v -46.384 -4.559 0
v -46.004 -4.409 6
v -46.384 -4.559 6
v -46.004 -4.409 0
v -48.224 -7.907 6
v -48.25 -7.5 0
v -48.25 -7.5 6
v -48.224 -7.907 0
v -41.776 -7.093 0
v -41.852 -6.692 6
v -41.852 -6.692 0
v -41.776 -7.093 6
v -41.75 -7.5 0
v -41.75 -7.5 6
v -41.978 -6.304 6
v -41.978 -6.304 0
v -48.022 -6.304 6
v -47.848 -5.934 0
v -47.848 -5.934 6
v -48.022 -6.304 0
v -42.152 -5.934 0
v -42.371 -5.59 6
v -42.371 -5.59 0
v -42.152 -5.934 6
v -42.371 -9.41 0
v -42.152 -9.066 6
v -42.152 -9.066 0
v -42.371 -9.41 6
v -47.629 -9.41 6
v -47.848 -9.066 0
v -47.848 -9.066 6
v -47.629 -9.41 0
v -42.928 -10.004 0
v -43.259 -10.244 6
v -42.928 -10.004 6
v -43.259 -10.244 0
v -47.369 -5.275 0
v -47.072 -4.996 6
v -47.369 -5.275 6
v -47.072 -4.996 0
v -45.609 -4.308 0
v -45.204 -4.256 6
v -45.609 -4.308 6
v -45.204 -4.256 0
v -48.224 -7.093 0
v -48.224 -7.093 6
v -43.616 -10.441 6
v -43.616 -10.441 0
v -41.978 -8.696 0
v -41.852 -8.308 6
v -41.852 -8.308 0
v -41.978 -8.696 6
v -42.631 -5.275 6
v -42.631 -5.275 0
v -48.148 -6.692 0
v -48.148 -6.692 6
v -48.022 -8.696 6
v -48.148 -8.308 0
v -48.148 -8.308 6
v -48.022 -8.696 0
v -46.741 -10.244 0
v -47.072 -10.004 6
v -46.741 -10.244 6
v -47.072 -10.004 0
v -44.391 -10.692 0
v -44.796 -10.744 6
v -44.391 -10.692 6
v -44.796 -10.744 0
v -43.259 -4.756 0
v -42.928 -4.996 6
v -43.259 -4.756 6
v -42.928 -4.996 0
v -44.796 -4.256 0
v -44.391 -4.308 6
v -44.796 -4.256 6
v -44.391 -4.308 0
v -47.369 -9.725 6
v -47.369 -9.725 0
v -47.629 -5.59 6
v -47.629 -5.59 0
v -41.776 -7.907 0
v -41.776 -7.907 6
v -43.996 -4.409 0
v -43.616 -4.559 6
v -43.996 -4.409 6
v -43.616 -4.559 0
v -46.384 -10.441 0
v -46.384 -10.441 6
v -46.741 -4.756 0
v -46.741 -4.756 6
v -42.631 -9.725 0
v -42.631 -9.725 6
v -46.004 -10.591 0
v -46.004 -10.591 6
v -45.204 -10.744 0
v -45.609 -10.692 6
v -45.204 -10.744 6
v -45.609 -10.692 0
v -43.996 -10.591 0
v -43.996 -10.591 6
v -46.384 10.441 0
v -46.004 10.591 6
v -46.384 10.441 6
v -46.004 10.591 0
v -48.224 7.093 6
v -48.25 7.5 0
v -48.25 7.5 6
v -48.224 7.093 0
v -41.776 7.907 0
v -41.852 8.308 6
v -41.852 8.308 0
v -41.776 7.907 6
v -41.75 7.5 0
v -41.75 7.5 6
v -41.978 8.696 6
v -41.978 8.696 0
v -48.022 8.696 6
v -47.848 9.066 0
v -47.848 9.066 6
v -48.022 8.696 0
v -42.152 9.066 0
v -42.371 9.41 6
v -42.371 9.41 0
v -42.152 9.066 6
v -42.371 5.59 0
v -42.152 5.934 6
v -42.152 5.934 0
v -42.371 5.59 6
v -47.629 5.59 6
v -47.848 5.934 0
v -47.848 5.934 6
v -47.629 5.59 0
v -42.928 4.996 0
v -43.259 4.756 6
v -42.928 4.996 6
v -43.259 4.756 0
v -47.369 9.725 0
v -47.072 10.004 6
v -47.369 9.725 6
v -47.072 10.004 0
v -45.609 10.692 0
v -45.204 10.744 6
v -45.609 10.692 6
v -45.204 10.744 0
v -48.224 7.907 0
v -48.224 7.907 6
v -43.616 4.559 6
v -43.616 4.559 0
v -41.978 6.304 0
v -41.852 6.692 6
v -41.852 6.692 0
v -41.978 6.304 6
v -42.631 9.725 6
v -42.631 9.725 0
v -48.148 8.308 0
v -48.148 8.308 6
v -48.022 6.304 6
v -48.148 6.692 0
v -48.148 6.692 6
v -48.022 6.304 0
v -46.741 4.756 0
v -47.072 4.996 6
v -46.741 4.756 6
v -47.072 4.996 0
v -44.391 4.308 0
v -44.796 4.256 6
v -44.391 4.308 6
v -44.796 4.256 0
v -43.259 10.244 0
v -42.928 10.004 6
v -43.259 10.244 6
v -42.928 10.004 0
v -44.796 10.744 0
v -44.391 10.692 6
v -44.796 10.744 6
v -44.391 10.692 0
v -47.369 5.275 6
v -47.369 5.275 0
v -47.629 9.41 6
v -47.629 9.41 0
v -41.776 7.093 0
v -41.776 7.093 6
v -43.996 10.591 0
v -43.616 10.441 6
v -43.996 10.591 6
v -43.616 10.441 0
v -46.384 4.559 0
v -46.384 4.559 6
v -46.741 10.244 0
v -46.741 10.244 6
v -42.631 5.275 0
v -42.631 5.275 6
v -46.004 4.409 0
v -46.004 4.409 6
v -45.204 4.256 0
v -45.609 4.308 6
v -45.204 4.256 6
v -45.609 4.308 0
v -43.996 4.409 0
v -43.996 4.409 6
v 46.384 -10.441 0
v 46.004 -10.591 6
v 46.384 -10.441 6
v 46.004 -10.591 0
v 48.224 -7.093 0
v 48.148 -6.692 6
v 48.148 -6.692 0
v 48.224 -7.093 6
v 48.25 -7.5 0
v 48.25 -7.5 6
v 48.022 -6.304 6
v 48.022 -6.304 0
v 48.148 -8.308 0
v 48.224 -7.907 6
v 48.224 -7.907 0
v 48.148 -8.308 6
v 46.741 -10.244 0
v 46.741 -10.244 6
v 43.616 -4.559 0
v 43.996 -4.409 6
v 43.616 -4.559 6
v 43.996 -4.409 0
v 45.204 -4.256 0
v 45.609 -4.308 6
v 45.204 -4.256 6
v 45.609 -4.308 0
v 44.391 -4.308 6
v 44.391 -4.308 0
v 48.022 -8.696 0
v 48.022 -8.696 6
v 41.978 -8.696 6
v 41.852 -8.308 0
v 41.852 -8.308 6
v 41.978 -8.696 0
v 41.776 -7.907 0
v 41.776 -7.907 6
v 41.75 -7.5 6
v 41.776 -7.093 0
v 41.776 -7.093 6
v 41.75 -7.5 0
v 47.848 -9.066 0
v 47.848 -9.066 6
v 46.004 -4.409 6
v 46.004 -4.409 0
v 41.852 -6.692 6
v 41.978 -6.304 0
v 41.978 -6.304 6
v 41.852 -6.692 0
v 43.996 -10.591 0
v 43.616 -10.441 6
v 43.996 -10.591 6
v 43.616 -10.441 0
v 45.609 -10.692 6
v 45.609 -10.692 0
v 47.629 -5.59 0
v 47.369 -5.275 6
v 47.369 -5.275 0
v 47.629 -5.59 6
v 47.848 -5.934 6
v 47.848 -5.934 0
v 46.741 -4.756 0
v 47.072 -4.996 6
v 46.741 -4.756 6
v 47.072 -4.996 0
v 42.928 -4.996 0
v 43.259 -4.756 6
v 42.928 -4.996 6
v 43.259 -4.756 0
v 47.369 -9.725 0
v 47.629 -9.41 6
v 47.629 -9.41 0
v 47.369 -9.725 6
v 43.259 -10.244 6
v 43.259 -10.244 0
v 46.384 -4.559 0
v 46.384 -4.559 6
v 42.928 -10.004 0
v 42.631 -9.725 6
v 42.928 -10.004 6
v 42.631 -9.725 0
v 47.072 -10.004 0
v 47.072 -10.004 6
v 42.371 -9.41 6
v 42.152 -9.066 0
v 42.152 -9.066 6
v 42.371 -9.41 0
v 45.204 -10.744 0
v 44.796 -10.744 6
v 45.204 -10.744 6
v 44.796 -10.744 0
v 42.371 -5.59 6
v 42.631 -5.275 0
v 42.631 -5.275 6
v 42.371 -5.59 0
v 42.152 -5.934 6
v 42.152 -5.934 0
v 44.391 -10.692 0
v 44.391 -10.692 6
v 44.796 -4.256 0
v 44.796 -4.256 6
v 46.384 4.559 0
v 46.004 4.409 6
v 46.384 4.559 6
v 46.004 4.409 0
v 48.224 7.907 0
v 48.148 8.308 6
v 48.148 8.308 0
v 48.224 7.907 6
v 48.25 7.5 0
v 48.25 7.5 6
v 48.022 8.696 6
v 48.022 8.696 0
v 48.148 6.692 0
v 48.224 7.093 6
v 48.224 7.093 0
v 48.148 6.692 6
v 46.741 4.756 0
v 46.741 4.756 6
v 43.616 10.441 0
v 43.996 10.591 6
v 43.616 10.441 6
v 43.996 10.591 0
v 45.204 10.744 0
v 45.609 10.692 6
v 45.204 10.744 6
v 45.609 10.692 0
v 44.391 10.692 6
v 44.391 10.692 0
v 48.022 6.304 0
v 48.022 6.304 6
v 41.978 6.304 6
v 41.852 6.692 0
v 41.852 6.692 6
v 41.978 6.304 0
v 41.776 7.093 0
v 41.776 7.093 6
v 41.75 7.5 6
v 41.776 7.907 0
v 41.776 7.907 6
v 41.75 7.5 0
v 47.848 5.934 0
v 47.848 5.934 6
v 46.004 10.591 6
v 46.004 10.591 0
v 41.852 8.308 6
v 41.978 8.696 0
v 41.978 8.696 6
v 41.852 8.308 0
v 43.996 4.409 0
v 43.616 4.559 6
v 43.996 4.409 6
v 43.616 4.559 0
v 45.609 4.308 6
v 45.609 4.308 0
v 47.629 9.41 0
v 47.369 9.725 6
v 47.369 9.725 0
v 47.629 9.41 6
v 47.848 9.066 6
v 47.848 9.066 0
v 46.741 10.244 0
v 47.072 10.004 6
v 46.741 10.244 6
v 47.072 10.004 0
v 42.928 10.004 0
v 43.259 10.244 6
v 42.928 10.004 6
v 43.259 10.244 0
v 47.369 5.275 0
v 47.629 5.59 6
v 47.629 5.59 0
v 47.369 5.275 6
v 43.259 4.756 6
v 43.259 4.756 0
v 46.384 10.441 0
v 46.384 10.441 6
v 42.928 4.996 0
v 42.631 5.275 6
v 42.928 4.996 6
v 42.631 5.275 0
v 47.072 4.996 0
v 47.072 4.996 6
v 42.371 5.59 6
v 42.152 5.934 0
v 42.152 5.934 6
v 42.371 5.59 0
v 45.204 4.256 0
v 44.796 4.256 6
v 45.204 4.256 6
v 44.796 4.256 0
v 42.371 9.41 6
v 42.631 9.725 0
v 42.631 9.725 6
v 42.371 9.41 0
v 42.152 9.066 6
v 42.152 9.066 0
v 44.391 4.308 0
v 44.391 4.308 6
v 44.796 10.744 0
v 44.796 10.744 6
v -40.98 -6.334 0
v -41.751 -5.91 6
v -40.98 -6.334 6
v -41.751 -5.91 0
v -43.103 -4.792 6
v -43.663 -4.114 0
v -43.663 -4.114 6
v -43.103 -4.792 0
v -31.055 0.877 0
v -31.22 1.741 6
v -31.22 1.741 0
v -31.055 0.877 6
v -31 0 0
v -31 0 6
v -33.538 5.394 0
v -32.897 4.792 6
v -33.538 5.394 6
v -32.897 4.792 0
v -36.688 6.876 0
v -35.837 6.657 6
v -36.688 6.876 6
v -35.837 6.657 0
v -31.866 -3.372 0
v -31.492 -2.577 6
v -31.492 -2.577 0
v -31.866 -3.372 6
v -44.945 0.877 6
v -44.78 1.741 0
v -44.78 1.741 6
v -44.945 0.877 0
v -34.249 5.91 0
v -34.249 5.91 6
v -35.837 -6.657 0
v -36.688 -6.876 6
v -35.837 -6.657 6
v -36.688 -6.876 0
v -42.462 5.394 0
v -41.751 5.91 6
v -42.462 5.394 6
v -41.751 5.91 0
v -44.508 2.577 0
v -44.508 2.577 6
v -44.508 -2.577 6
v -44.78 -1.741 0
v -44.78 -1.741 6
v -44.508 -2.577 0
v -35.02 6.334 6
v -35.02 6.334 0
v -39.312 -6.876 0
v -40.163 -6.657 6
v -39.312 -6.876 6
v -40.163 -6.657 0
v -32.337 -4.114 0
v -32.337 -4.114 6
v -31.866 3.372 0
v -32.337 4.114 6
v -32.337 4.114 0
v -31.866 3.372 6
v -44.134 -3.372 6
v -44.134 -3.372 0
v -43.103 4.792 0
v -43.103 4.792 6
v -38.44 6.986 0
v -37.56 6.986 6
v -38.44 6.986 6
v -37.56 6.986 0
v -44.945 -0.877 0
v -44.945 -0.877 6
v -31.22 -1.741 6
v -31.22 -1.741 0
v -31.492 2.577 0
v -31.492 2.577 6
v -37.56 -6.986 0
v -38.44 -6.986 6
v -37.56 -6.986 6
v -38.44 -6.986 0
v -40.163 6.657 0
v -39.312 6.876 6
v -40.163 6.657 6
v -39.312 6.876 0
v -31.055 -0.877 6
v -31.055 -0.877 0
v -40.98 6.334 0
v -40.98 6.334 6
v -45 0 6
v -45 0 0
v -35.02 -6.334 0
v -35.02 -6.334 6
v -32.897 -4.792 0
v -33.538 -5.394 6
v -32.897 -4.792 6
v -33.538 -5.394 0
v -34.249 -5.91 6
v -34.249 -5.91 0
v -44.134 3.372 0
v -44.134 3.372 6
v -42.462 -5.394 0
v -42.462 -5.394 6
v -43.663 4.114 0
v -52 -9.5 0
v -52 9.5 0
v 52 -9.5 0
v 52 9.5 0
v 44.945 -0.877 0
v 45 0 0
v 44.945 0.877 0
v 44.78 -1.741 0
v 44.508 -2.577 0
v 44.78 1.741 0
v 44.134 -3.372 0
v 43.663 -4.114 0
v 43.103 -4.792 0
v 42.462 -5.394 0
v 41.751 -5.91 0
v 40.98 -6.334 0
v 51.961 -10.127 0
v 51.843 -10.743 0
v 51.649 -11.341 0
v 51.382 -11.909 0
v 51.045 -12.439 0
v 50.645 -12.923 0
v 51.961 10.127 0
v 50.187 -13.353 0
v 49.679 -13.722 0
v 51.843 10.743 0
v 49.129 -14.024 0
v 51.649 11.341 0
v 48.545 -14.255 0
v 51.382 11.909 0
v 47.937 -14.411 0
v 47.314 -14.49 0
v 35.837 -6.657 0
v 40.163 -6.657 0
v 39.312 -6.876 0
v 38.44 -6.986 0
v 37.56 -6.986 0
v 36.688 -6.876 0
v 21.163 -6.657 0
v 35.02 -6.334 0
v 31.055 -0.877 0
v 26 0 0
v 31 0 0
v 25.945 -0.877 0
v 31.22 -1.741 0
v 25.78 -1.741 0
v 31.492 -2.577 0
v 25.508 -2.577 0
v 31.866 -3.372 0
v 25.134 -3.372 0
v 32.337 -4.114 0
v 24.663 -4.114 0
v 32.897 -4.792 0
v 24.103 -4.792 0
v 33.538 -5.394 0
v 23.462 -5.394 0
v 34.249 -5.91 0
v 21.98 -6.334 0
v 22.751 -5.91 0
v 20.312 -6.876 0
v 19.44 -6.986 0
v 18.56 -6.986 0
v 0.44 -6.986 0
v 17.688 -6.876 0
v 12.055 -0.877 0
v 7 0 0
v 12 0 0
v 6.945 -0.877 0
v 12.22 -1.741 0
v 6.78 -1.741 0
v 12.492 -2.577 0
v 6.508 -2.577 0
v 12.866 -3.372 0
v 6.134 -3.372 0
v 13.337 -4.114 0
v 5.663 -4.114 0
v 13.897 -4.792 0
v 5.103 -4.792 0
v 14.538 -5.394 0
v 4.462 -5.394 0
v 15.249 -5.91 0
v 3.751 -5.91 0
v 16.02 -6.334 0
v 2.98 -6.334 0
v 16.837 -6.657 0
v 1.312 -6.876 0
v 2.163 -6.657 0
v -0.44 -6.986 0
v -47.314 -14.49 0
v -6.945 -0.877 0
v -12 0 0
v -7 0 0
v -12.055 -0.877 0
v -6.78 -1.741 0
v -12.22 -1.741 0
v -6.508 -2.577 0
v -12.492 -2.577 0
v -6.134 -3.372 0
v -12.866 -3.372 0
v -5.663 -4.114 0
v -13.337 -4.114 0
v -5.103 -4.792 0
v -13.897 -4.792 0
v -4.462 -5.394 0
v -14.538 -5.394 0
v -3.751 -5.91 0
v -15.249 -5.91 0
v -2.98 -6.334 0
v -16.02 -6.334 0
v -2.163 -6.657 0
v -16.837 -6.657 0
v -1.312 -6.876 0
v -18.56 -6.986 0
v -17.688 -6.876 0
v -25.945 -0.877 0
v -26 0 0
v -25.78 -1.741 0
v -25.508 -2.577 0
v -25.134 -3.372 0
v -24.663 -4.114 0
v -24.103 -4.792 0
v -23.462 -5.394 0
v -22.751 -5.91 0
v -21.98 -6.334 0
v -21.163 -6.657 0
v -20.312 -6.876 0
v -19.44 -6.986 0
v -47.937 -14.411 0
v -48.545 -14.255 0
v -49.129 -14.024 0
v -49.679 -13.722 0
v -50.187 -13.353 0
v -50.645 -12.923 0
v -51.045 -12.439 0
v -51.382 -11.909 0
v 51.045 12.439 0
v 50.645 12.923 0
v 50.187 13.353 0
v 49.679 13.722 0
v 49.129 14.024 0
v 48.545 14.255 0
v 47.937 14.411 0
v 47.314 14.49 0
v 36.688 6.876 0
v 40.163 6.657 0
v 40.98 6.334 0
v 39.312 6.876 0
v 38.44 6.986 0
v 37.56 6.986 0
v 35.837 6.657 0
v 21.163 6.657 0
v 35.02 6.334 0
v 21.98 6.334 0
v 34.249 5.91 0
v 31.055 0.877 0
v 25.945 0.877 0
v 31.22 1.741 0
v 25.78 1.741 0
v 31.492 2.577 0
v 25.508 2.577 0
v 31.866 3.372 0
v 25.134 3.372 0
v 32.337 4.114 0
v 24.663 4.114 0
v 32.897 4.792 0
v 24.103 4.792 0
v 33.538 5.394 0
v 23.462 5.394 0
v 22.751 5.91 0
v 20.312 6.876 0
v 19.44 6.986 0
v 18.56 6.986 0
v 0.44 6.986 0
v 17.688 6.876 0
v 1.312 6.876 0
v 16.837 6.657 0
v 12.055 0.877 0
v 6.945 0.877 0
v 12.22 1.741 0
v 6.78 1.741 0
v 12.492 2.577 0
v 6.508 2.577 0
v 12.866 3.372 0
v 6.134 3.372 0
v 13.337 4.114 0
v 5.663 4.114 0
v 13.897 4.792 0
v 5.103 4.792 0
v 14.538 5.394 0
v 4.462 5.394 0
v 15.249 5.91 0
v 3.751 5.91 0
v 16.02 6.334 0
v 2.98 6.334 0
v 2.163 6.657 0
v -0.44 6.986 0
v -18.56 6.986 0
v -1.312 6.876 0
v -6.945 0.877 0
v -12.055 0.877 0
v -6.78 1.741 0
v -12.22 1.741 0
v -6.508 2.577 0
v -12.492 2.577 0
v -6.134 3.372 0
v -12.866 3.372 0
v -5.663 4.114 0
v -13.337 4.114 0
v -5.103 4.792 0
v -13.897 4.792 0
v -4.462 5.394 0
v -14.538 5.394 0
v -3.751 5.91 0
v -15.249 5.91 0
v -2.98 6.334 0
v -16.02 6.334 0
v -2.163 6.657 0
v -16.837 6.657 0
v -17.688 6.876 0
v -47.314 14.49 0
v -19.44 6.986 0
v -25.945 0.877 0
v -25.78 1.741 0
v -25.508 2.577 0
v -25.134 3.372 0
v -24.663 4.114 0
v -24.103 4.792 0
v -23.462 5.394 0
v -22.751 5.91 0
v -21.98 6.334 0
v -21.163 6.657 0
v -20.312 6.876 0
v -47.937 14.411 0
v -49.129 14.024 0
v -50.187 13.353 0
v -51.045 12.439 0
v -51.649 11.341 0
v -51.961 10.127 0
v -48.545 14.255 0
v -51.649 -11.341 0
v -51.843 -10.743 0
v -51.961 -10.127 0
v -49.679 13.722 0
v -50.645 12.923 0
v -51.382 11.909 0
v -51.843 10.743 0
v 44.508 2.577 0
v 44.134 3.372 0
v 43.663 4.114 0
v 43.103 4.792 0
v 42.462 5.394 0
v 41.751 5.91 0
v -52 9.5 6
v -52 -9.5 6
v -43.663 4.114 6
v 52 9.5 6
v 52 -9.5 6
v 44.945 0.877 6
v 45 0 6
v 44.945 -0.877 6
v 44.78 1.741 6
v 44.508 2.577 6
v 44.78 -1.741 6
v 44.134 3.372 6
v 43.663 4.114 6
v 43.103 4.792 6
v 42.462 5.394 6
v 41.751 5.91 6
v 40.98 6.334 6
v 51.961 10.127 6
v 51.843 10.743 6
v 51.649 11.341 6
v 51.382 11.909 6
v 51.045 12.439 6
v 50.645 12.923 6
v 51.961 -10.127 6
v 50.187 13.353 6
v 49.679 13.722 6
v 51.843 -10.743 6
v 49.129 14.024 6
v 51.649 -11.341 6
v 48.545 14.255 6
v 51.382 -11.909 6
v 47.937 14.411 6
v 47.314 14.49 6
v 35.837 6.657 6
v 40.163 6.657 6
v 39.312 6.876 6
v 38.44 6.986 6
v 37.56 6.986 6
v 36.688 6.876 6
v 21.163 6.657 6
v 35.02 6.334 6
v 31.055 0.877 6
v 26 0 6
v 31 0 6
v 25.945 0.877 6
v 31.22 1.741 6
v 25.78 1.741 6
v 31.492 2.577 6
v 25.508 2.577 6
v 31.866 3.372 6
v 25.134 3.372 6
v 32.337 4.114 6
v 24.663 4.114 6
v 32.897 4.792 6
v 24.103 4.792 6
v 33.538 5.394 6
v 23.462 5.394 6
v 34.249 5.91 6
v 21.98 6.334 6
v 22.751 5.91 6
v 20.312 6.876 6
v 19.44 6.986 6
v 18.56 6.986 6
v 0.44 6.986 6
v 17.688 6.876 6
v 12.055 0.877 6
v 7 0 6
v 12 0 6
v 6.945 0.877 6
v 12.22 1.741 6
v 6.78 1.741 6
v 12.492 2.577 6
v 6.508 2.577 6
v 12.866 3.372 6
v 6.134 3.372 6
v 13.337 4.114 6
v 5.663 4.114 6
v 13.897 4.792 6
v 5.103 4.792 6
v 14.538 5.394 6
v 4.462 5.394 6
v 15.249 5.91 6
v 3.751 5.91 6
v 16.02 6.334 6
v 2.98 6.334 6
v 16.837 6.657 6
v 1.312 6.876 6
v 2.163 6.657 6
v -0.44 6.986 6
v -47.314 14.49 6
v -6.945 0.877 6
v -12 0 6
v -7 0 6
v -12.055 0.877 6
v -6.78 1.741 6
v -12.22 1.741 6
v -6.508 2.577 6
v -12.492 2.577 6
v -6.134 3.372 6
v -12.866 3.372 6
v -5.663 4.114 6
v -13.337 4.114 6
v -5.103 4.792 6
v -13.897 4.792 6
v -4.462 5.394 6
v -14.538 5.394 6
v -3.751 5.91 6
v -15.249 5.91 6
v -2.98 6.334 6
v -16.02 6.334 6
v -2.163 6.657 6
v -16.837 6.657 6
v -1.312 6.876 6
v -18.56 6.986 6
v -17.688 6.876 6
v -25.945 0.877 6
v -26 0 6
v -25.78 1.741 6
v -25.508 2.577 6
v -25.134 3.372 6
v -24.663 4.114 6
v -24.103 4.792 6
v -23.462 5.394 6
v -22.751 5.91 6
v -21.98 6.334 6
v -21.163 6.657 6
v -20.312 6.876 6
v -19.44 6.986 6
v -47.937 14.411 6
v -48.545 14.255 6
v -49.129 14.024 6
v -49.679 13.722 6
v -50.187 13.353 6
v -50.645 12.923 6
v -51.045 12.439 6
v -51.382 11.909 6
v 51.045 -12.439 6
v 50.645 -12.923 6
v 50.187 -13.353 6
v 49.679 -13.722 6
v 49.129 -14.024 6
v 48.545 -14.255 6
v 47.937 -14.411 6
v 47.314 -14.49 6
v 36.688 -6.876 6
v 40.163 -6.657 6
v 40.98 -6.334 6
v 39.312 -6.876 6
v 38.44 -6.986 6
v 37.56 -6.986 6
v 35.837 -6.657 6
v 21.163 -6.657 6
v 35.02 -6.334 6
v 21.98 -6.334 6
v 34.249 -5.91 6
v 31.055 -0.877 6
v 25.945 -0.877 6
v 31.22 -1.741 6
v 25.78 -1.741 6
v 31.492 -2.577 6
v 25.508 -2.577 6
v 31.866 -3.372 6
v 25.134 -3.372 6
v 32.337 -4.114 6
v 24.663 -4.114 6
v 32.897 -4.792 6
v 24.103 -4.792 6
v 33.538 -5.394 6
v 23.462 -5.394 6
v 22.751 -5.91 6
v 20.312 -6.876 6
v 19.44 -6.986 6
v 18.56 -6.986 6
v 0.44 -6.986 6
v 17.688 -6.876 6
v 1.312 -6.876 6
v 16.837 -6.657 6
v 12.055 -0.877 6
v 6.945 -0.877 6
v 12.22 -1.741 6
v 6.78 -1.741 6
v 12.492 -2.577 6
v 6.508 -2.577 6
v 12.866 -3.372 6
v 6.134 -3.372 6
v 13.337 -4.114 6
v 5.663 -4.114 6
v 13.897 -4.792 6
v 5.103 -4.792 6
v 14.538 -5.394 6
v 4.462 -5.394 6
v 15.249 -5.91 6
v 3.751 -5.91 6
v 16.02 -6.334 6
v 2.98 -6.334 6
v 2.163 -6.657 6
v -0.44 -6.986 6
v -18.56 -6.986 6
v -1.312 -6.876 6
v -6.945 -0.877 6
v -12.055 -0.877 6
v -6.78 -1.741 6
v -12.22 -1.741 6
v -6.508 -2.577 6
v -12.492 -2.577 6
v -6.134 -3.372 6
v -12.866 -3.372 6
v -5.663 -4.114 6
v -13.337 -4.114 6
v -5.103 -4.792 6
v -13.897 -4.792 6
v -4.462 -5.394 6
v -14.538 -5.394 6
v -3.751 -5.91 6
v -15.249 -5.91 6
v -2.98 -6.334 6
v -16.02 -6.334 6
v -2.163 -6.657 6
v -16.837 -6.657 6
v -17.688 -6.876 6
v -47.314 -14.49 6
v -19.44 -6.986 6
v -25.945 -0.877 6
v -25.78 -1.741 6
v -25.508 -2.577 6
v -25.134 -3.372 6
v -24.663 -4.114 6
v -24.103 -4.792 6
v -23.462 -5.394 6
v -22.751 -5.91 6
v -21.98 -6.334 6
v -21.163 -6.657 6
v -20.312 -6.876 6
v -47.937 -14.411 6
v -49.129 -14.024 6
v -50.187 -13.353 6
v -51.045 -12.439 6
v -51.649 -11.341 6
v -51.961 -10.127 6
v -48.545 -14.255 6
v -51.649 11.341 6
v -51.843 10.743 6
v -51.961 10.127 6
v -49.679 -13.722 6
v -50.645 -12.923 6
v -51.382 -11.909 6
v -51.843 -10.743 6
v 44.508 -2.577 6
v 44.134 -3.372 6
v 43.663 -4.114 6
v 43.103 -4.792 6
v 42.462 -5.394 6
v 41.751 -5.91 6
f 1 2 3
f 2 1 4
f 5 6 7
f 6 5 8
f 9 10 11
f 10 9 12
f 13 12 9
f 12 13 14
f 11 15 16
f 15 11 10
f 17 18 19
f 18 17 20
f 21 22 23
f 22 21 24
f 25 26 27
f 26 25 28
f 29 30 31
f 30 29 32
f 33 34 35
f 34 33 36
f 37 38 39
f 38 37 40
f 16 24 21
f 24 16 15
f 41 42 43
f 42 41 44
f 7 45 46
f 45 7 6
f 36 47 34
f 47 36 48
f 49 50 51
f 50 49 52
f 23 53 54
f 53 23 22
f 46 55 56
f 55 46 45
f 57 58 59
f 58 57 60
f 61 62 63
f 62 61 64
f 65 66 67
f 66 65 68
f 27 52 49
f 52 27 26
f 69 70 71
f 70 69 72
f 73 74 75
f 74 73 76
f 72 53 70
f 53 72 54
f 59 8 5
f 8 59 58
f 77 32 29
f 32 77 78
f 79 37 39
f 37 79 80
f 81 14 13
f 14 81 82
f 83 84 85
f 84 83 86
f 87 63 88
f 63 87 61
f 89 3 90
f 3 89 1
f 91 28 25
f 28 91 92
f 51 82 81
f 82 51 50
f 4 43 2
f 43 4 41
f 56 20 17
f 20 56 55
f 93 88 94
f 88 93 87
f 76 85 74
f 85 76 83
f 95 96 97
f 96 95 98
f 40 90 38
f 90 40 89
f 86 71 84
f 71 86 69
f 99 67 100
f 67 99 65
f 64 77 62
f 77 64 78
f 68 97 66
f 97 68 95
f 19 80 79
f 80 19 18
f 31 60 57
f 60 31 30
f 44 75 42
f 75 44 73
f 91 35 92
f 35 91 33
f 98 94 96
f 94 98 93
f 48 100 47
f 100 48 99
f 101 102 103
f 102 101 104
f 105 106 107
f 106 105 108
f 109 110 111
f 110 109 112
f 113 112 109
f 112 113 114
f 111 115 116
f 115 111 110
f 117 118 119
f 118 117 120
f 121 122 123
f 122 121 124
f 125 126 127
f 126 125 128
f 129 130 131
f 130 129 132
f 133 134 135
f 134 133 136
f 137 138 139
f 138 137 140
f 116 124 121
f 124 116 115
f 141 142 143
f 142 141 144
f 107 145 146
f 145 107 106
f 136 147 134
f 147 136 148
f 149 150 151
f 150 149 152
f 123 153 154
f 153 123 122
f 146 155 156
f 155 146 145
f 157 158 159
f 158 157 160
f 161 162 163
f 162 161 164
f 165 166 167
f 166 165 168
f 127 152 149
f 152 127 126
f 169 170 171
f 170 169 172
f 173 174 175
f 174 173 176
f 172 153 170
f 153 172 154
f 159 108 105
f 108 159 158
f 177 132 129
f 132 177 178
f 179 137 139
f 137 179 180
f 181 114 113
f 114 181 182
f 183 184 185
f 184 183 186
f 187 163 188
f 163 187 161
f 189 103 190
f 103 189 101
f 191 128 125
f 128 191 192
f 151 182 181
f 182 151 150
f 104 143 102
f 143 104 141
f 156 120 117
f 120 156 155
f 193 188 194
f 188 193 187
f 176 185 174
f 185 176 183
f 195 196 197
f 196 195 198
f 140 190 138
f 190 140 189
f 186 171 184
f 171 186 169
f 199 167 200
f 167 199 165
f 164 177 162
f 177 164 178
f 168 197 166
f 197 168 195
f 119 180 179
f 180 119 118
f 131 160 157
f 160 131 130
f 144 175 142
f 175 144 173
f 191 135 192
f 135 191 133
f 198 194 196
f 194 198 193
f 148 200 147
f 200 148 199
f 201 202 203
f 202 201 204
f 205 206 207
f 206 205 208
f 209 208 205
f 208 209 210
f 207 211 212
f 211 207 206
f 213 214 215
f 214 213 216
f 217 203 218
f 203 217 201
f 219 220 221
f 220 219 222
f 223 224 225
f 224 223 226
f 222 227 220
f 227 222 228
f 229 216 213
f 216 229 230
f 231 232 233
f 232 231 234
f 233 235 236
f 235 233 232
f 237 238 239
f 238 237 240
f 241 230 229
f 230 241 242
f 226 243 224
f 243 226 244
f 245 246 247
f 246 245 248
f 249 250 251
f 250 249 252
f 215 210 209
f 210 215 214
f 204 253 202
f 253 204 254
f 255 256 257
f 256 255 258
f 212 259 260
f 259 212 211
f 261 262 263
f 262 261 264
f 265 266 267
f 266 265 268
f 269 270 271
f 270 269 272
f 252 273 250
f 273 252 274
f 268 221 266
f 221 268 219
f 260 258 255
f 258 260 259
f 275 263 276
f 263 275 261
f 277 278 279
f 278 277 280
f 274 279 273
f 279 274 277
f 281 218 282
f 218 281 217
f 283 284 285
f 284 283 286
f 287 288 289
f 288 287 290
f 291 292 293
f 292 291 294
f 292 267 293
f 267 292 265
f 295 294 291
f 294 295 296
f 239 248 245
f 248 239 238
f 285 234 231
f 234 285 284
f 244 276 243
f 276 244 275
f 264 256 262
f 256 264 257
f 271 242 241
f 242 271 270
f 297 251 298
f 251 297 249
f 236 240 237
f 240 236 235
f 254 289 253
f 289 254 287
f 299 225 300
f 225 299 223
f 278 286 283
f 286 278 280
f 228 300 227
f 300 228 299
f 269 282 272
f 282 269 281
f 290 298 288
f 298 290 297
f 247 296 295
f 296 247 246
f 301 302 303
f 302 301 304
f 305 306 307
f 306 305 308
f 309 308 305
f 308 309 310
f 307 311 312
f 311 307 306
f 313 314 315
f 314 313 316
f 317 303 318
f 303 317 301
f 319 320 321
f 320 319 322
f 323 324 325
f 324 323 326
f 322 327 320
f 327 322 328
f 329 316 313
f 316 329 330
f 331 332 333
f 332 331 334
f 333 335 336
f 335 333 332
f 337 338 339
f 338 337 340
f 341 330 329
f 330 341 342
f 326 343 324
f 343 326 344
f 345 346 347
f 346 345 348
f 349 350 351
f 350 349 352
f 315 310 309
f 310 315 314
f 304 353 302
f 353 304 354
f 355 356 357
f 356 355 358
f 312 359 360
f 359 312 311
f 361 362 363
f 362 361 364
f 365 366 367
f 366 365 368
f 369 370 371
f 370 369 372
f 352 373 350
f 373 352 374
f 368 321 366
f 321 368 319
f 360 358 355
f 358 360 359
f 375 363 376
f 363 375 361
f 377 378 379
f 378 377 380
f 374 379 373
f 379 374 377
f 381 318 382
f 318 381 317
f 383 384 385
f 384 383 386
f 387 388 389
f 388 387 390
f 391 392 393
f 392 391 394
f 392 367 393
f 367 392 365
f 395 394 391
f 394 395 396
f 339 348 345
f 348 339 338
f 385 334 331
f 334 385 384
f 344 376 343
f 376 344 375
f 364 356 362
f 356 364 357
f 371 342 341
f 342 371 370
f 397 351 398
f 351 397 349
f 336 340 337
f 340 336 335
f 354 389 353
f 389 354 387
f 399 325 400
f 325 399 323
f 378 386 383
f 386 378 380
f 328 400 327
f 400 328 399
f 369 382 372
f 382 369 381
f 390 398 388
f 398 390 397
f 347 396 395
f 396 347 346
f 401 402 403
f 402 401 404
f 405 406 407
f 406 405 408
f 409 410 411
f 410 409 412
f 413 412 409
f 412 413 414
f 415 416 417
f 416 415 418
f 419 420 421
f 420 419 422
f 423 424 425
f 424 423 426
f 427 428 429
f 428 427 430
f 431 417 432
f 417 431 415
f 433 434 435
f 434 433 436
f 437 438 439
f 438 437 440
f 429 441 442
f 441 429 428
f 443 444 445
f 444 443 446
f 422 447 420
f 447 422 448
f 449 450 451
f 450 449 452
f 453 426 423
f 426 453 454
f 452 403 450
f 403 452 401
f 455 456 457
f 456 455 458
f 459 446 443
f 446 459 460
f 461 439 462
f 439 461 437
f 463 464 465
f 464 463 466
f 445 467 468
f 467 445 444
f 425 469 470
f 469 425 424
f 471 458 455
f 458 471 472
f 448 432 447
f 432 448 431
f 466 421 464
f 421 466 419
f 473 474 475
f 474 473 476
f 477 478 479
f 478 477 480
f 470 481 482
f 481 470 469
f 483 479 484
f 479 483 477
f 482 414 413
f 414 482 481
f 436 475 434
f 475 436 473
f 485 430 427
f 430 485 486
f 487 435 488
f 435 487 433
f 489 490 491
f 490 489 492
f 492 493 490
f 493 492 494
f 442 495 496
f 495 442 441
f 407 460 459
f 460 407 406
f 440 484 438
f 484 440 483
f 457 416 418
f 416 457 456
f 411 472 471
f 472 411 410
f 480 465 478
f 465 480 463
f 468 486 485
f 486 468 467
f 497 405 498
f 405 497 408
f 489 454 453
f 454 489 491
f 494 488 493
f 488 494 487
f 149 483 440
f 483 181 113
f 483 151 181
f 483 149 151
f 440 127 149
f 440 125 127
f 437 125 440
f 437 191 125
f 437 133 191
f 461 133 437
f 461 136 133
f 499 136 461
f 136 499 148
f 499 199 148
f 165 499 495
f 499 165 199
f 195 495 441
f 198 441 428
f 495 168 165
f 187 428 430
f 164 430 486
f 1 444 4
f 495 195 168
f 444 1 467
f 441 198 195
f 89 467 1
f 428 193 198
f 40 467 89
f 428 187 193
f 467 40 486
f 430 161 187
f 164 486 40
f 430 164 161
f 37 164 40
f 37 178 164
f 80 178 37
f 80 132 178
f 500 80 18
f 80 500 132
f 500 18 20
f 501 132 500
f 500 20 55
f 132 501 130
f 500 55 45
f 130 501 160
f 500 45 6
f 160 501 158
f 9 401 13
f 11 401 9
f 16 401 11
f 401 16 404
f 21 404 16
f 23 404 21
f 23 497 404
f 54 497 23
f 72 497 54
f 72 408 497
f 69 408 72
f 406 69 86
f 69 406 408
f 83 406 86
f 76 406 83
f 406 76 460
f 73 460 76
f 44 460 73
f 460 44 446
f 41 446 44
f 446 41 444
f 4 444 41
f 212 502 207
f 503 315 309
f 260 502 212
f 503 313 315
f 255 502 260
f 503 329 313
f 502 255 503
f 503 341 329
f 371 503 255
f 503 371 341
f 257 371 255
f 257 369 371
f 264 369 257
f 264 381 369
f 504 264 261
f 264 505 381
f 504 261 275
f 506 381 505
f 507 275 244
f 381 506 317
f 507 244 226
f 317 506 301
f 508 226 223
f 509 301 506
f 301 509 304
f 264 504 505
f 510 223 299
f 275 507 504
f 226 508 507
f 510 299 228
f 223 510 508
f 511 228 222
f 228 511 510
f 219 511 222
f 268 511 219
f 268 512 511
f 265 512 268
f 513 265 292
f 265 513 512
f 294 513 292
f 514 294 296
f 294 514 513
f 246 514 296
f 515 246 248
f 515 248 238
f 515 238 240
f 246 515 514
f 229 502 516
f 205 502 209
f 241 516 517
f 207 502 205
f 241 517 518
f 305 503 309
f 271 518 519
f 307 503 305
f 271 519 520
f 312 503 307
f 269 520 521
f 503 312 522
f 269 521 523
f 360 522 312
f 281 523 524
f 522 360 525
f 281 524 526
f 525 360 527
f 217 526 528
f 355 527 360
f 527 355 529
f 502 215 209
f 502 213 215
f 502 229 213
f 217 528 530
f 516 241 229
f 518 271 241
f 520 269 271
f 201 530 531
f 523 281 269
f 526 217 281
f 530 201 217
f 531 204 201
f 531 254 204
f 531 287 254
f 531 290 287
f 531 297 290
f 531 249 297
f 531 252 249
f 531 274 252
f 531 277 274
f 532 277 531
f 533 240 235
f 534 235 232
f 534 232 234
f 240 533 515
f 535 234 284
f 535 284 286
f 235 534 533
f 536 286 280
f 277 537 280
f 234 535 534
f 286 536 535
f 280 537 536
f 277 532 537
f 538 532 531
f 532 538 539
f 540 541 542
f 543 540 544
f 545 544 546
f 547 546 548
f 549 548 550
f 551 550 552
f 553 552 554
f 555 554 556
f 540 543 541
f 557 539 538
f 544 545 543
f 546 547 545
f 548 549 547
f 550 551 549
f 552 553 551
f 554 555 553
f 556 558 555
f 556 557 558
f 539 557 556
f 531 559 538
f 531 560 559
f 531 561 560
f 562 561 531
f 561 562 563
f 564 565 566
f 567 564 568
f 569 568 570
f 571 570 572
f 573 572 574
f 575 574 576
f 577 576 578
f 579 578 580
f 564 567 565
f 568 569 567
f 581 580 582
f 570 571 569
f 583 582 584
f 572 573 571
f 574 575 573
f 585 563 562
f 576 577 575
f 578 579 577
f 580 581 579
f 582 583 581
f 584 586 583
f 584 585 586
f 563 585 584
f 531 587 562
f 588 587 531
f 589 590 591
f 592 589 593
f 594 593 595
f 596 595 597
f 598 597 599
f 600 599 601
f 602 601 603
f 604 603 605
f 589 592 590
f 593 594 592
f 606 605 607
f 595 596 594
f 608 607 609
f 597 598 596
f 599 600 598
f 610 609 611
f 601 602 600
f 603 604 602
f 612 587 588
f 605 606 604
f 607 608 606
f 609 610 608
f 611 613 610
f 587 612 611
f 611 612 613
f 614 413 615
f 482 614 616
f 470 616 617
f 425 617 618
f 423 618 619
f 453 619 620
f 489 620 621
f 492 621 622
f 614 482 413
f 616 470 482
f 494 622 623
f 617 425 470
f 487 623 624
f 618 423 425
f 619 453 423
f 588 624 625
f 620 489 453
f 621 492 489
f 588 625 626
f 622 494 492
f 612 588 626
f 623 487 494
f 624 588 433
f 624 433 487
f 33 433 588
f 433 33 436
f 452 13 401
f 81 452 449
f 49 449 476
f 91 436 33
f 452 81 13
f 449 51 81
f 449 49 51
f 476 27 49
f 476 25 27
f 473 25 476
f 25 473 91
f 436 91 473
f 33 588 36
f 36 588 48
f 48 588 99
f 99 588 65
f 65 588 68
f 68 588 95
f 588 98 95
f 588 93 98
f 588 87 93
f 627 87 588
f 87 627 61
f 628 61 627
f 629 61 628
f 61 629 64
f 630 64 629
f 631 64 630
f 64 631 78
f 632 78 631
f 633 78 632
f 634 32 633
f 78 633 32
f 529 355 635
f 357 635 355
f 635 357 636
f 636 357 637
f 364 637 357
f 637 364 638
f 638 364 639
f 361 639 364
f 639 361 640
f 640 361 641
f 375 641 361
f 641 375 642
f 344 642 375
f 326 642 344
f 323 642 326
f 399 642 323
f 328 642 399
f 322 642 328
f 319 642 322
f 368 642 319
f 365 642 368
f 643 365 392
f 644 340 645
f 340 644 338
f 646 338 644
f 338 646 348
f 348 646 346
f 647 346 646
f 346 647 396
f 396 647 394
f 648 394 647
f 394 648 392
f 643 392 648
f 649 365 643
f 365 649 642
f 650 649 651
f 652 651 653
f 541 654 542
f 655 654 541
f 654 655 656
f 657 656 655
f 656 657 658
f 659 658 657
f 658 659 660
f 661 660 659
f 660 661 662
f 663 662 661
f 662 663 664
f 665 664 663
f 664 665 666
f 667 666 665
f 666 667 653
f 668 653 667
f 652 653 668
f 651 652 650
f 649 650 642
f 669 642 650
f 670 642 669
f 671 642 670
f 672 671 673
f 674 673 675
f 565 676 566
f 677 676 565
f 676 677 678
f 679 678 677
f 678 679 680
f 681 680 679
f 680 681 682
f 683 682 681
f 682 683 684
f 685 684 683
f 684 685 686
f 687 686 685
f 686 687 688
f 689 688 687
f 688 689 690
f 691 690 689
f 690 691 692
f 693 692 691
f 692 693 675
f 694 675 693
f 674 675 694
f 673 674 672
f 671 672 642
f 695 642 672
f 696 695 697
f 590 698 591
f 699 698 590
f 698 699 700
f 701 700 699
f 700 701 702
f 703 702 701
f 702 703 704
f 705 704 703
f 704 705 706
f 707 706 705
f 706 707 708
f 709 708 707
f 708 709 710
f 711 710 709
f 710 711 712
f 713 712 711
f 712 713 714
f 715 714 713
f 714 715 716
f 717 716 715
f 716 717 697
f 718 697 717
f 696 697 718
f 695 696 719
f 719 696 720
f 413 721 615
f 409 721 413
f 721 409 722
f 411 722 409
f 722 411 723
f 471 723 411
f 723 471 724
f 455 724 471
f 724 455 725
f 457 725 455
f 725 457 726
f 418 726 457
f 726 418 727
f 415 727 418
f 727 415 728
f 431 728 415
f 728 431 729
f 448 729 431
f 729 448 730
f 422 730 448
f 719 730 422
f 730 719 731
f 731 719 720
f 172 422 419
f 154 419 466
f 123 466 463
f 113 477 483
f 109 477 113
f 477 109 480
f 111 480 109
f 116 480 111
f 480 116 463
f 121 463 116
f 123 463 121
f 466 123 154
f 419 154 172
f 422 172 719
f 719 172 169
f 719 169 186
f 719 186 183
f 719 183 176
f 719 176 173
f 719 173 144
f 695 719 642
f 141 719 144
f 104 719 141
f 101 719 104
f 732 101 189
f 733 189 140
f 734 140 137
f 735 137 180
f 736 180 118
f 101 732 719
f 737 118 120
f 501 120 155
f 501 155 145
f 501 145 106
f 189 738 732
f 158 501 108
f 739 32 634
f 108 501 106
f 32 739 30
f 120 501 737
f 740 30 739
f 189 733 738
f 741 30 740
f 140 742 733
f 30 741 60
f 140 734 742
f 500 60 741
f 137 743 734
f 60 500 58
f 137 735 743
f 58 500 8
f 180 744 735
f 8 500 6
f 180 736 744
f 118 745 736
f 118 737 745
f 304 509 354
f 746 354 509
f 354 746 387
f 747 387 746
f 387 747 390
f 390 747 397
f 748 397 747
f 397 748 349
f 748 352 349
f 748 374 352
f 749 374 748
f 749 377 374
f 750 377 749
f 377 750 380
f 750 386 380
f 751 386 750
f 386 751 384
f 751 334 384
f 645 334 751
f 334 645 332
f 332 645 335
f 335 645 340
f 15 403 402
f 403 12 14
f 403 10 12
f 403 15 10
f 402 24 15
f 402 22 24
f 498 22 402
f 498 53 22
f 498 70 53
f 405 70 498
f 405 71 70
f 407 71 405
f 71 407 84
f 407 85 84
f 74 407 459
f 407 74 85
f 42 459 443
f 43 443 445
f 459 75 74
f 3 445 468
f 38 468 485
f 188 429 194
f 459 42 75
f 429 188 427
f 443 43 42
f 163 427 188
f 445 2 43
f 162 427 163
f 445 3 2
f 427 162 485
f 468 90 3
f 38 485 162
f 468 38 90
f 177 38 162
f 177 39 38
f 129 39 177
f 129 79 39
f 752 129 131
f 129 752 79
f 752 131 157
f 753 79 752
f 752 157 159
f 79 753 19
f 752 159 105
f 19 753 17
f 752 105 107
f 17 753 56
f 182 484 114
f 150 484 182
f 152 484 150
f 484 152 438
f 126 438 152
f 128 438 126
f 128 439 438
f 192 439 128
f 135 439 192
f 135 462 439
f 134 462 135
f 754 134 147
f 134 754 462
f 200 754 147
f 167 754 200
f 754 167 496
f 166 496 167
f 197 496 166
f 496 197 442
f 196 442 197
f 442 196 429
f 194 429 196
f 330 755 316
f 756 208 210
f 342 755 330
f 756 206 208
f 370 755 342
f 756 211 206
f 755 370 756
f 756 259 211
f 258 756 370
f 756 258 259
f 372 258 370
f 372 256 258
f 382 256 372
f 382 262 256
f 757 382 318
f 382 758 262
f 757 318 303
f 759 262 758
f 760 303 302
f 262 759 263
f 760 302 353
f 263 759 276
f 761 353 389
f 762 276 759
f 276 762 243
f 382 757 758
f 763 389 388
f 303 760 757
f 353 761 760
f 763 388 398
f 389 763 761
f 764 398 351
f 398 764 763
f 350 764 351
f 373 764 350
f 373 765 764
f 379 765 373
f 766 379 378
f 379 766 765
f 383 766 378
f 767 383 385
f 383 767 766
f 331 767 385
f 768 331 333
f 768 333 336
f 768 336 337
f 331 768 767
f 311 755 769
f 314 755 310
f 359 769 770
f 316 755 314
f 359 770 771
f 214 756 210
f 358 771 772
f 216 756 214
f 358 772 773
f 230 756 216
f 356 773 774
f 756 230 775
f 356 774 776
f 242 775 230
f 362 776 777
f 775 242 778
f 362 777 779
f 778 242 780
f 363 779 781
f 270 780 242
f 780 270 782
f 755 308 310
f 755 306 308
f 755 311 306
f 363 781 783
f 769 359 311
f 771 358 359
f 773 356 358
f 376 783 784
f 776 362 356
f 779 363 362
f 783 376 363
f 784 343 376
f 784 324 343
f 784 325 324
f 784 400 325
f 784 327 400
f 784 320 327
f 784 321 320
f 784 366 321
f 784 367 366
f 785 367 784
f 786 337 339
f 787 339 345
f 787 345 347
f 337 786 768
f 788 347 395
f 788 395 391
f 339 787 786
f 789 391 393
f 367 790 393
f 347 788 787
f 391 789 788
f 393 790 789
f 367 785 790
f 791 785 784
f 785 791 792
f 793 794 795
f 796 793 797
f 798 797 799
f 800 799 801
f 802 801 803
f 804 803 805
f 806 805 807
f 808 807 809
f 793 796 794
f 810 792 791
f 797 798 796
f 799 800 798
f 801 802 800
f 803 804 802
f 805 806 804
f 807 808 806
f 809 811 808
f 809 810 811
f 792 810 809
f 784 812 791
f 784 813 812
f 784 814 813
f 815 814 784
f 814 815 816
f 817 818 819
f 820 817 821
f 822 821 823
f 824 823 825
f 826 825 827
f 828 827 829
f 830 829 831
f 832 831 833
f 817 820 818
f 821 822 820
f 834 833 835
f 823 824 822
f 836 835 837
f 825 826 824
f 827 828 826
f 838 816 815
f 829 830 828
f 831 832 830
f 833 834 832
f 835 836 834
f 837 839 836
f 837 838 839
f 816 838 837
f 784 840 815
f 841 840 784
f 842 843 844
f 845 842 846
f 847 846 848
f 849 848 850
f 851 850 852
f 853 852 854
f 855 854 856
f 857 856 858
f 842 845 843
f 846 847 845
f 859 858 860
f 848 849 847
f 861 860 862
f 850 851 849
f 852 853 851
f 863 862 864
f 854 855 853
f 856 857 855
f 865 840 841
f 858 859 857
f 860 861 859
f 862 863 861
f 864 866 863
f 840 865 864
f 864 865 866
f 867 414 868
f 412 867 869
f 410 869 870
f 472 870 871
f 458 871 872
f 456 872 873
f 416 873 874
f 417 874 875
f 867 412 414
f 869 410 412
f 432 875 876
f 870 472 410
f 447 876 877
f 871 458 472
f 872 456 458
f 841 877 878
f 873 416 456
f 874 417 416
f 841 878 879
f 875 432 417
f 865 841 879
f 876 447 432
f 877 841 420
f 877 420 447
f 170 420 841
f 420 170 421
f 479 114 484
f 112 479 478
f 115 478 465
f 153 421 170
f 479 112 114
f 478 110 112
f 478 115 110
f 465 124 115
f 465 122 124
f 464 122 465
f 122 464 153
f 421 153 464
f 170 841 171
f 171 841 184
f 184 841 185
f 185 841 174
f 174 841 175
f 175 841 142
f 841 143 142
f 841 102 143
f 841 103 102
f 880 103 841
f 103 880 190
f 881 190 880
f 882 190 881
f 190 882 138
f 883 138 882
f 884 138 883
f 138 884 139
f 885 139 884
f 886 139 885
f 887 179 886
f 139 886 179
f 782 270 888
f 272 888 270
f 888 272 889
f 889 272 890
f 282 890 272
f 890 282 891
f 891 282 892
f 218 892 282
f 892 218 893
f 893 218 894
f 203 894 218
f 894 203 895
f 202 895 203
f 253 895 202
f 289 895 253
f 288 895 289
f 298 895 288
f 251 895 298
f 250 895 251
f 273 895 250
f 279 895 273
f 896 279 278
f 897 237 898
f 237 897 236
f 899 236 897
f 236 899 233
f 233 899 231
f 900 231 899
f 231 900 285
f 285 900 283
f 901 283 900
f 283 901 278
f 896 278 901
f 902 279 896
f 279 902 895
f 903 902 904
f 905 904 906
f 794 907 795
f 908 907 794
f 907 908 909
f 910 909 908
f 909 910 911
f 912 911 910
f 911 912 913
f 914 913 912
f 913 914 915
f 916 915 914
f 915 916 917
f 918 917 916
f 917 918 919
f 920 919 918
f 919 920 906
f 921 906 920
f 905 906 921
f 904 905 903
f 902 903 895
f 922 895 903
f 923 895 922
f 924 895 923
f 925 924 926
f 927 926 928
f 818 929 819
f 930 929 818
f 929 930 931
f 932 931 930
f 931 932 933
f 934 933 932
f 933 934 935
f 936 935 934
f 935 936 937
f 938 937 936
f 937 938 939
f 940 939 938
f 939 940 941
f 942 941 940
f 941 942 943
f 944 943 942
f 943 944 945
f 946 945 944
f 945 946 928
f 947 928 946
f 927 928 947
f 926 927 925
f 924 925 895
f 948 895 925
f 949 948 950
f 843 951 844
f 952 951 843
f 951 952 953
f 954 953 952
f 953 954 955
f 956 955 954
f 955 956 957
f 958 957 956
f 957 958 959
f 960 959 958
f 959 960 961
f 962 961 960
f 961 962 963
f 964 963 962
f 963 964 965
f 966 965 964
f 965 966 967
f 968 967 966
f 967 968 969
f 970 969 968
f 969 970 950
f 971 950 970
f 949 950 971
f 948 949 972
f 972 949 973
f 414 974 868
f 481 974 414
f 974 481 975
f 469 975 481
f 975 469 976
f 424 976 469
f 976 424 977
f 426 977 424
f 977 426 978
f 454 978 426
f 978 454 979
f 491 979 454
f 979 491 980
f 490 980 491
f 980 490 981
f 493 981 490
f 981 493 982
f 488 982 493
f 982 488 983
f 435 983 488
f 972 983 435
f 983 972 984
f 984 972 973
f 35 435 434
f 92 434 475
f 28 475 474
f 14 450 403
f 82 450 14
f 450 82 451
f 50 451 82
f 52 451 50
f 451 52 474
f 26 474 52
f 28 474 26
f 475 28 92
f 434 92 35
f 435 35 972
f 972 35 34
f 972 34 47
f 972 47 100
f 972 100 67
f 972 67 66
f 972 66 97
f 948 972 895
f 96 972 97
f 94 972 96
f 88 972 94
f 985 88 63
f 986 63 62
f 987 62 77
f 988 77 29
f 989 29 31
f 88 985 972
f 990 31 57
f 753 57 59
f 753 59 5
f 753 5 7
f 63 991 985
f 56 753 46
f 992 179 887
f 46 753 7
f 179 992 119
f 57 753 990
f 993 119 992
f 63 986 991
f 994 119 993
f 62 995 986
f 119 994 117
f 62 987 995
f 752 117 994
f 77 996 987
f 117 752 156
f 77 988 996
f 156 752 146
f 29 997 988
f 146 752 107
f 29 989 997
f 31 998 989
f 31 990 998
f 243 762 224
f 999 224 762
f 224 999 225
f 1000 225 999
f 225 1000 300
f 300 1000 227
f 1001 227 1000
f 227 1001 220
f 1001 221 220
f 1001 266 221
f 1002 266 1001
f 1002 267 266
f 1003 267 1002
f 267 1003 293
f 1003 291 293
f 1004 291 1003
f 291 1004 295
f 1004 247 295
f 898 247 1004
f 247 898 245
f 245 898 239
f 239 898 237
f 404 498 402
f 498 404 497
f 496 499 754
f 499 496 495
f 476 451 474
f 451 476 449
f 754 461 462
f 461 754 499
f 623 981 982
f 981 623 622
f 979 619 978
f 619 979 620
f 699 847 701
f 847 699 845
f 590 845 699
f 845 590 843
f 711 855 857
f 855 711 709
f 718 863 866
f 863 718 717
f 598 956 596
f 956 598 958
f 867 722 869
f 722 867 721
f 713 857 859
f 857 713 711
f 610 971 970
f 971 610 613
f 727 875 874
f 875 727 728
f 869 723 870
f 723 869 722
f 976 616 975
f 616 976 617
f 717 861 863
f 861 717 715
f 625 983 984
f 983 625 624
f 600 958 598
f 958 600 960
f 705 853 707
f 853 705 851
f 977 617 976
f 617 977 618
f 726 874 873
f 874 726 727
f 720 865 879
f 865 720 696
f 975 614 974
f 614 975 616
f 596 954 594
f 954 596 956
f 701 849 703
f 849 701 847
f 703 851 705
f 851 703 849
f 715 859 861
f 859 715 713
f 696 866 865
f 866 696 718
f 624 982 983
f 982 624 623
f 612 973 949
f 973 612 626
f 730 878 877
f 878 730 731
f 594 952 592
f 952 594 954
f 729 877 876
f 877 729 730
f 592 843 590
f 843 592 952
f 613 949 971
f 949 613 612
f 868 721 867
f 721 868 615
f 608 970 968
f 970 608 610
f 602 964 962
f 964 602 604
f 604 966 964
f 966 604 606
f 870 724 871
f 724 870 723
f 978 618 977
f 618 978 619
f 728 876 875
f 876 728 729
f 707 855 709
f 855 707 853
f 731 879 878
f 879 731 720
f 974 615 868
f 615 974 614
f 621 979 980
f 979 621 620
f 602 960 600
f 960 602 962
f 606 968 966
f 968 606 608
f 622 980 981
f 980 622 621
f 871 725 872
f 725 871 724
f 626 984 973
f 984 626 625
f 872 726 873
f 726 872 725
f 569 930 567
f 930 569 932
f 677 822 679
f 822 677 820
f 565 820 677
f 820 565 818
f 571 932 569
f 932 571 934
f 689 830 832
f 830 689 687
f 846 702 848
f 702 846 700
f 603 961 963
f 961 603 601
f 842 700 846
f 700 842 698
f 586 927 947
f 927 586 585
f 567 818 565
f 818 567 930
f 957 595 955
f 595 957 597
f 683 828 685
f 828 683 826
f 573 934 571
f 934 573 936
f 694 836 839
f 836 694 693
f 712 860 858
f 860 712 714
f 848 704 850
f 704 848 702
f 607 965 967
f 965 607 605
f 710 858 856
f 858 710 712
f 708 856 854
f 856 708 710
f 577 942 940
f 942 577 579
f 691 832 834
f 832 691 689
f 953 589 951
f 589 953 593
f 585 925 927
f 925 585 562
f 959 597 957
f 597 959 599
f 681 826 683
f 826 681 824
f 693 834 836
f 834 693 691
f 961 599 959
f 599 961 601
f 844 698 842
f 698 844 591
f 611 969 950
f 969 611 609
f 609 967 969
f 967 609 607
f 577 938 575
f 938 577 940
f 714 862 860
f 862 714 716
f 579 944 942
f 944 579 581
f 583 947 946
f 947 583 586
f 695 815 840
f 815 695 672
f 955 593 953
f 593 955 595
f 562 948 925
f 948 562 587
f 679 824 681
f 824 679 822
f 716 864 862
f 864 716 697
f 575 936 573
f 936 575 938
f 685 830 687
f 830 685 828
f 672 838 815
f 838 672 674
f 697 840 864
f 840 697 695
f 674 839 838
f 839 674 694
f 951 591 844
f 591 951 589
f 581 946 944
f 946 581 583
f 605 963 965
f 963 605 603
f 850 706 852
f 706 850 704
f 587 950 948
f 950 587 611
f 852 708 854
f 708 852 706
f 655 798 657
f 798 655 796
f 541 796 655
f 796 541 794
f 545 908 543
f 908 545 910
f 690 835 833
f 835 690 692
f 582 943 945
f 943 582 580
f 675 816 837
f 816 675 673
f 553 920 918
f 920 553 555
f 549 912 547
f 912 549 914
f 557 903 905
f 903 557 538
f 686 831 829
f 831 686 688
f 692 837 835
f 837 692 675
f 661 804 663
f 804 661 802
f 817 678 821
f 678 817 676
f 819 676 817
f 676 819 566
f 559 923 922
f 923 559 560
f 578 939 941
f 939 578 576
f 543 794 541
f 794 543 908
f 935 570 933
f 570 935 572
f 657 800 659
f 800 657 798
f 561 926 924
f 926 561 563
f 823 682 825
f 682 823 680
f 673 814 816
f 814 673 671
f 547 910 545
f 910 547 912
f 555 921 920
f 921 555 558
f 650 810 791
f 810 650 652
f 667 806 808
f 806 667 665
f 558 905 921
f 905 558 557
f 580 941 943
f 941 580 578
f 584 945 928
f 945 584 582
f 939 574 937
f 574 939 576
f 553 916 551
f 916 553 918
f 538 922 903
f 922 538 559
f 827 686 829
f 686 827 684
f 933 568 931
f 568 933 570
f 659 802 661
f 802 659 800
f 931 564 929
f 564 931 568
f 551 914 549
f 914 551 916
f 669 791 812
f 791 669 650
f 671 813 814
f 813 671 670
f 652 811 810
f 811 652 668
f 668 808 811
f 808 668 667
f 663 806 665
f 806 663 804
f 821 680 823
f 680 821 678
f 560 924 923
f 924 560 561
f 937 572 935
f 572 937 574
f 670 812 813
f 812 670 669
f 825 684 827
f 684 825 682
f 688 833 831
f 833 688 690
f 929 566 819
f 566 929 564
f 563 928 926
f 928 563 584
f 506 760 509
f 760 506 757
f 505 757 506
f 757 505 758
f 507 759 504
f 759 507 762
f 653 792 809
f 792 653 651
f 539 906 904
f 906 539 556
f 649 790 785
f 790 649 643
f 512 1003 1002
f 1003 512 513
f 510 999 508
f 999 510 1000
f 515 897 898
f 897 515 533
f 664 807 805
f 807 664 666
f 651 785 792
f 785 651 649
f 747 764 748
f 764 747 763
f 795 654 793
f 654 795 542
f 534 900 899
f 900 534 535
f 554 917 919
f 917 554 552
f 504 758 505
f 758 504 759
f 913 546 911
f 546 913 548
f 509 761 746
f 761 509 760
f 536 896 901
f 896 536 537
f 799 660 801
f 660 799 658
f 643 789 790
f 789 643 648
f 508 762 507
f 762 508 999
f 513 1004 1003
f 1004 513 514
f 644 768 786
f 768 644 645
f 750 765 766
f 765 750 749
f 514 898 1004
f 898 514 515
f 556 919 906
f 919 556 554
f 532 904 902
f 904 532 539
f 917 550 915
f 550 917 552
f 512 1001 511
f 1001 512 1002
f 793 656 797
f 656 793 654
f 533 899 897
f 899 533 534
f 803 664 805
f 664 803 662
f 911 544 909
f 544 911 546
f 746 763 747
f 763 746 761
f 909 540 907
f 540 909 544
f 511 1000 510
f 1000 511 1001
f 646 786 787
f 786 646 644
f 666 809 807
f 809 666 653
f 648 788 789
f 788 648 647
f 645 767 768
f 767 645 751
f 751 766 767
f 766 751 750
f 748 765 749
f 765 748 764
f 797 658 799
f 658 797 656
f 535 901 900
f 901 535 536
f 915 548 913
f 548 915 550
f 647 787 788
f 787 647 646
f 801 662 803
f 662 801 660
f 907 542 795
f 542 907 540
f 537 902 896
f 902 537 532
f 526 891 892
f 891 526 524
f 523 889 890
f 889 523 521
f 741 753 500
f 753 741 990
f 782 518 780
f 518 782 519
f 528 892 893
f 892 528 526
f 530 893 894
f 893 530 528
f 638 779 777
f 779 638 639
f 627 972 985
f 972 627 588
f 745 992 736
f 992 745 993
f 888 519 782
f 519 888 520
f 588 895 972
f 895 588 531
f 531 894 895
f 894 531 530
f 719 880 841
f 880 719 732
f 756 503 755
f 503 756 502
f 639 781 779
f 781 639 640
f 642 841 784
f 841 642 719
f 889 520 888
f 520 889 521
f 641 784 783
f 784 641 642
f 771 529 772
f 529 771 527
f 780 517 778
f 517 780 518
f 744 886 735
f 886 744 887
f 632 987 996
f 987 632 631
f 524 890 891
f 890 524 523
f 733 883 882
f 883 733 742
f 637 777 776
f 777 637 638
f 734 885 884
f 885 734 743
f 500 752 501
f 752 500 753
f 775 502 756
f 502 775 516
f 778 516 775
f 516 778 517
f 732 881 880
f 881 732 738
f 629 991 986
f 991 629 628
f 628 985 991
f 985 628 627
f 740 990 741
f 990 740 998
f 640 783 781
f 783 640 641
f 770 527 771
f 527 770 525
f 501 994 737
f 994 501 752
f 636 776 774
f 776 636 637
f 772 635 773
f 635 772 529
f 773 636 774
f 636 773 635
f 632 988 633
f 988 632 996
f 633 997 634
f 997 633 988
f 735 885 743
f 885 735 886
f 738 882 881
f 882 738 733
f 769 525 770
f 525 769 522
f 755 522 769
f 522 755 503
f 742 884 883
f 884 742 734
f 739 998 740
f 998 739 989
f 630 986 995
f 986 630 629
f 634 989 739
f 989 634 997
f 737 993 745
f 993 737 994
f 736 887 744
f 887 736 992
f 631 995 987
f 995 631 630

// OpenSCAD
$fn = 50;

difference() {
	union() {
		hull() {
			translate(v = [-47.0, 9.5, 0]) {
				cylinder(h = 6, r = 5);
			}
			translate(v = [47.0, 9.5, 0]) {
				cylinder(h = 6, r = 5);
			}
			translate(v = [-47.0, -9.5, 0]) {
				cylinder(h = 6, r = 5);
			}
			translate(v = [47.0, -9.5, 0]) {
				cylinder(h = 6, r = 5);
			}
		}
	}
	union() {
		translate(v = [-45.0, -7.5, -100.0]) {
			cylinder(h = 200, r = 3.25);
		}
		translate(v = [-45.0, 7.5, -100.0]) {
			cylinder(h = 200, r = 3.25);
		}
		translate(v = [45.0, -7.5, -100.0]) {
			cylinder(h = 200, r = 3.25);
		}
		translate(v = [45.0, 7.5, -100.0]) {
			cylinder(h = 200, r = 3.25);
		}
		translate(v = [-45.0, -7.5, -100.0]) {
			cylinder(h = 200, r = 1.8);
		}
		translate(v = [-45.0, 7.5, -100.0]) {
			cylinder(h = 200, r = 1.8);
		}
		translate(v = [45.0, -7.5, -100.0]) {
			cylinder(h = 200, r = 1.8);
		}
		translate(v = [45.0, 7.5, -100.0]) {
			cylinder(h = 200, r = 1.8);
		}
		translate(v = [-38.0, 0, 0.0]) {
			cylinder(h = 6, r = 7.0);
		}
		translate(v = [-19.0, 0, 0.0]) {
			cylinder(h = 6, r = 7.0);
		}
		cylinder(h = 6, r = 7.0);
		translate(v = [19.0, 0, 0.0]) {
			cylinder(h = 6, r = 7.0);
		}
		translate(v = [38.0, 0, 0.0]) {
			cylinder(h = 6, r = 7.0);
		}
	}
}
